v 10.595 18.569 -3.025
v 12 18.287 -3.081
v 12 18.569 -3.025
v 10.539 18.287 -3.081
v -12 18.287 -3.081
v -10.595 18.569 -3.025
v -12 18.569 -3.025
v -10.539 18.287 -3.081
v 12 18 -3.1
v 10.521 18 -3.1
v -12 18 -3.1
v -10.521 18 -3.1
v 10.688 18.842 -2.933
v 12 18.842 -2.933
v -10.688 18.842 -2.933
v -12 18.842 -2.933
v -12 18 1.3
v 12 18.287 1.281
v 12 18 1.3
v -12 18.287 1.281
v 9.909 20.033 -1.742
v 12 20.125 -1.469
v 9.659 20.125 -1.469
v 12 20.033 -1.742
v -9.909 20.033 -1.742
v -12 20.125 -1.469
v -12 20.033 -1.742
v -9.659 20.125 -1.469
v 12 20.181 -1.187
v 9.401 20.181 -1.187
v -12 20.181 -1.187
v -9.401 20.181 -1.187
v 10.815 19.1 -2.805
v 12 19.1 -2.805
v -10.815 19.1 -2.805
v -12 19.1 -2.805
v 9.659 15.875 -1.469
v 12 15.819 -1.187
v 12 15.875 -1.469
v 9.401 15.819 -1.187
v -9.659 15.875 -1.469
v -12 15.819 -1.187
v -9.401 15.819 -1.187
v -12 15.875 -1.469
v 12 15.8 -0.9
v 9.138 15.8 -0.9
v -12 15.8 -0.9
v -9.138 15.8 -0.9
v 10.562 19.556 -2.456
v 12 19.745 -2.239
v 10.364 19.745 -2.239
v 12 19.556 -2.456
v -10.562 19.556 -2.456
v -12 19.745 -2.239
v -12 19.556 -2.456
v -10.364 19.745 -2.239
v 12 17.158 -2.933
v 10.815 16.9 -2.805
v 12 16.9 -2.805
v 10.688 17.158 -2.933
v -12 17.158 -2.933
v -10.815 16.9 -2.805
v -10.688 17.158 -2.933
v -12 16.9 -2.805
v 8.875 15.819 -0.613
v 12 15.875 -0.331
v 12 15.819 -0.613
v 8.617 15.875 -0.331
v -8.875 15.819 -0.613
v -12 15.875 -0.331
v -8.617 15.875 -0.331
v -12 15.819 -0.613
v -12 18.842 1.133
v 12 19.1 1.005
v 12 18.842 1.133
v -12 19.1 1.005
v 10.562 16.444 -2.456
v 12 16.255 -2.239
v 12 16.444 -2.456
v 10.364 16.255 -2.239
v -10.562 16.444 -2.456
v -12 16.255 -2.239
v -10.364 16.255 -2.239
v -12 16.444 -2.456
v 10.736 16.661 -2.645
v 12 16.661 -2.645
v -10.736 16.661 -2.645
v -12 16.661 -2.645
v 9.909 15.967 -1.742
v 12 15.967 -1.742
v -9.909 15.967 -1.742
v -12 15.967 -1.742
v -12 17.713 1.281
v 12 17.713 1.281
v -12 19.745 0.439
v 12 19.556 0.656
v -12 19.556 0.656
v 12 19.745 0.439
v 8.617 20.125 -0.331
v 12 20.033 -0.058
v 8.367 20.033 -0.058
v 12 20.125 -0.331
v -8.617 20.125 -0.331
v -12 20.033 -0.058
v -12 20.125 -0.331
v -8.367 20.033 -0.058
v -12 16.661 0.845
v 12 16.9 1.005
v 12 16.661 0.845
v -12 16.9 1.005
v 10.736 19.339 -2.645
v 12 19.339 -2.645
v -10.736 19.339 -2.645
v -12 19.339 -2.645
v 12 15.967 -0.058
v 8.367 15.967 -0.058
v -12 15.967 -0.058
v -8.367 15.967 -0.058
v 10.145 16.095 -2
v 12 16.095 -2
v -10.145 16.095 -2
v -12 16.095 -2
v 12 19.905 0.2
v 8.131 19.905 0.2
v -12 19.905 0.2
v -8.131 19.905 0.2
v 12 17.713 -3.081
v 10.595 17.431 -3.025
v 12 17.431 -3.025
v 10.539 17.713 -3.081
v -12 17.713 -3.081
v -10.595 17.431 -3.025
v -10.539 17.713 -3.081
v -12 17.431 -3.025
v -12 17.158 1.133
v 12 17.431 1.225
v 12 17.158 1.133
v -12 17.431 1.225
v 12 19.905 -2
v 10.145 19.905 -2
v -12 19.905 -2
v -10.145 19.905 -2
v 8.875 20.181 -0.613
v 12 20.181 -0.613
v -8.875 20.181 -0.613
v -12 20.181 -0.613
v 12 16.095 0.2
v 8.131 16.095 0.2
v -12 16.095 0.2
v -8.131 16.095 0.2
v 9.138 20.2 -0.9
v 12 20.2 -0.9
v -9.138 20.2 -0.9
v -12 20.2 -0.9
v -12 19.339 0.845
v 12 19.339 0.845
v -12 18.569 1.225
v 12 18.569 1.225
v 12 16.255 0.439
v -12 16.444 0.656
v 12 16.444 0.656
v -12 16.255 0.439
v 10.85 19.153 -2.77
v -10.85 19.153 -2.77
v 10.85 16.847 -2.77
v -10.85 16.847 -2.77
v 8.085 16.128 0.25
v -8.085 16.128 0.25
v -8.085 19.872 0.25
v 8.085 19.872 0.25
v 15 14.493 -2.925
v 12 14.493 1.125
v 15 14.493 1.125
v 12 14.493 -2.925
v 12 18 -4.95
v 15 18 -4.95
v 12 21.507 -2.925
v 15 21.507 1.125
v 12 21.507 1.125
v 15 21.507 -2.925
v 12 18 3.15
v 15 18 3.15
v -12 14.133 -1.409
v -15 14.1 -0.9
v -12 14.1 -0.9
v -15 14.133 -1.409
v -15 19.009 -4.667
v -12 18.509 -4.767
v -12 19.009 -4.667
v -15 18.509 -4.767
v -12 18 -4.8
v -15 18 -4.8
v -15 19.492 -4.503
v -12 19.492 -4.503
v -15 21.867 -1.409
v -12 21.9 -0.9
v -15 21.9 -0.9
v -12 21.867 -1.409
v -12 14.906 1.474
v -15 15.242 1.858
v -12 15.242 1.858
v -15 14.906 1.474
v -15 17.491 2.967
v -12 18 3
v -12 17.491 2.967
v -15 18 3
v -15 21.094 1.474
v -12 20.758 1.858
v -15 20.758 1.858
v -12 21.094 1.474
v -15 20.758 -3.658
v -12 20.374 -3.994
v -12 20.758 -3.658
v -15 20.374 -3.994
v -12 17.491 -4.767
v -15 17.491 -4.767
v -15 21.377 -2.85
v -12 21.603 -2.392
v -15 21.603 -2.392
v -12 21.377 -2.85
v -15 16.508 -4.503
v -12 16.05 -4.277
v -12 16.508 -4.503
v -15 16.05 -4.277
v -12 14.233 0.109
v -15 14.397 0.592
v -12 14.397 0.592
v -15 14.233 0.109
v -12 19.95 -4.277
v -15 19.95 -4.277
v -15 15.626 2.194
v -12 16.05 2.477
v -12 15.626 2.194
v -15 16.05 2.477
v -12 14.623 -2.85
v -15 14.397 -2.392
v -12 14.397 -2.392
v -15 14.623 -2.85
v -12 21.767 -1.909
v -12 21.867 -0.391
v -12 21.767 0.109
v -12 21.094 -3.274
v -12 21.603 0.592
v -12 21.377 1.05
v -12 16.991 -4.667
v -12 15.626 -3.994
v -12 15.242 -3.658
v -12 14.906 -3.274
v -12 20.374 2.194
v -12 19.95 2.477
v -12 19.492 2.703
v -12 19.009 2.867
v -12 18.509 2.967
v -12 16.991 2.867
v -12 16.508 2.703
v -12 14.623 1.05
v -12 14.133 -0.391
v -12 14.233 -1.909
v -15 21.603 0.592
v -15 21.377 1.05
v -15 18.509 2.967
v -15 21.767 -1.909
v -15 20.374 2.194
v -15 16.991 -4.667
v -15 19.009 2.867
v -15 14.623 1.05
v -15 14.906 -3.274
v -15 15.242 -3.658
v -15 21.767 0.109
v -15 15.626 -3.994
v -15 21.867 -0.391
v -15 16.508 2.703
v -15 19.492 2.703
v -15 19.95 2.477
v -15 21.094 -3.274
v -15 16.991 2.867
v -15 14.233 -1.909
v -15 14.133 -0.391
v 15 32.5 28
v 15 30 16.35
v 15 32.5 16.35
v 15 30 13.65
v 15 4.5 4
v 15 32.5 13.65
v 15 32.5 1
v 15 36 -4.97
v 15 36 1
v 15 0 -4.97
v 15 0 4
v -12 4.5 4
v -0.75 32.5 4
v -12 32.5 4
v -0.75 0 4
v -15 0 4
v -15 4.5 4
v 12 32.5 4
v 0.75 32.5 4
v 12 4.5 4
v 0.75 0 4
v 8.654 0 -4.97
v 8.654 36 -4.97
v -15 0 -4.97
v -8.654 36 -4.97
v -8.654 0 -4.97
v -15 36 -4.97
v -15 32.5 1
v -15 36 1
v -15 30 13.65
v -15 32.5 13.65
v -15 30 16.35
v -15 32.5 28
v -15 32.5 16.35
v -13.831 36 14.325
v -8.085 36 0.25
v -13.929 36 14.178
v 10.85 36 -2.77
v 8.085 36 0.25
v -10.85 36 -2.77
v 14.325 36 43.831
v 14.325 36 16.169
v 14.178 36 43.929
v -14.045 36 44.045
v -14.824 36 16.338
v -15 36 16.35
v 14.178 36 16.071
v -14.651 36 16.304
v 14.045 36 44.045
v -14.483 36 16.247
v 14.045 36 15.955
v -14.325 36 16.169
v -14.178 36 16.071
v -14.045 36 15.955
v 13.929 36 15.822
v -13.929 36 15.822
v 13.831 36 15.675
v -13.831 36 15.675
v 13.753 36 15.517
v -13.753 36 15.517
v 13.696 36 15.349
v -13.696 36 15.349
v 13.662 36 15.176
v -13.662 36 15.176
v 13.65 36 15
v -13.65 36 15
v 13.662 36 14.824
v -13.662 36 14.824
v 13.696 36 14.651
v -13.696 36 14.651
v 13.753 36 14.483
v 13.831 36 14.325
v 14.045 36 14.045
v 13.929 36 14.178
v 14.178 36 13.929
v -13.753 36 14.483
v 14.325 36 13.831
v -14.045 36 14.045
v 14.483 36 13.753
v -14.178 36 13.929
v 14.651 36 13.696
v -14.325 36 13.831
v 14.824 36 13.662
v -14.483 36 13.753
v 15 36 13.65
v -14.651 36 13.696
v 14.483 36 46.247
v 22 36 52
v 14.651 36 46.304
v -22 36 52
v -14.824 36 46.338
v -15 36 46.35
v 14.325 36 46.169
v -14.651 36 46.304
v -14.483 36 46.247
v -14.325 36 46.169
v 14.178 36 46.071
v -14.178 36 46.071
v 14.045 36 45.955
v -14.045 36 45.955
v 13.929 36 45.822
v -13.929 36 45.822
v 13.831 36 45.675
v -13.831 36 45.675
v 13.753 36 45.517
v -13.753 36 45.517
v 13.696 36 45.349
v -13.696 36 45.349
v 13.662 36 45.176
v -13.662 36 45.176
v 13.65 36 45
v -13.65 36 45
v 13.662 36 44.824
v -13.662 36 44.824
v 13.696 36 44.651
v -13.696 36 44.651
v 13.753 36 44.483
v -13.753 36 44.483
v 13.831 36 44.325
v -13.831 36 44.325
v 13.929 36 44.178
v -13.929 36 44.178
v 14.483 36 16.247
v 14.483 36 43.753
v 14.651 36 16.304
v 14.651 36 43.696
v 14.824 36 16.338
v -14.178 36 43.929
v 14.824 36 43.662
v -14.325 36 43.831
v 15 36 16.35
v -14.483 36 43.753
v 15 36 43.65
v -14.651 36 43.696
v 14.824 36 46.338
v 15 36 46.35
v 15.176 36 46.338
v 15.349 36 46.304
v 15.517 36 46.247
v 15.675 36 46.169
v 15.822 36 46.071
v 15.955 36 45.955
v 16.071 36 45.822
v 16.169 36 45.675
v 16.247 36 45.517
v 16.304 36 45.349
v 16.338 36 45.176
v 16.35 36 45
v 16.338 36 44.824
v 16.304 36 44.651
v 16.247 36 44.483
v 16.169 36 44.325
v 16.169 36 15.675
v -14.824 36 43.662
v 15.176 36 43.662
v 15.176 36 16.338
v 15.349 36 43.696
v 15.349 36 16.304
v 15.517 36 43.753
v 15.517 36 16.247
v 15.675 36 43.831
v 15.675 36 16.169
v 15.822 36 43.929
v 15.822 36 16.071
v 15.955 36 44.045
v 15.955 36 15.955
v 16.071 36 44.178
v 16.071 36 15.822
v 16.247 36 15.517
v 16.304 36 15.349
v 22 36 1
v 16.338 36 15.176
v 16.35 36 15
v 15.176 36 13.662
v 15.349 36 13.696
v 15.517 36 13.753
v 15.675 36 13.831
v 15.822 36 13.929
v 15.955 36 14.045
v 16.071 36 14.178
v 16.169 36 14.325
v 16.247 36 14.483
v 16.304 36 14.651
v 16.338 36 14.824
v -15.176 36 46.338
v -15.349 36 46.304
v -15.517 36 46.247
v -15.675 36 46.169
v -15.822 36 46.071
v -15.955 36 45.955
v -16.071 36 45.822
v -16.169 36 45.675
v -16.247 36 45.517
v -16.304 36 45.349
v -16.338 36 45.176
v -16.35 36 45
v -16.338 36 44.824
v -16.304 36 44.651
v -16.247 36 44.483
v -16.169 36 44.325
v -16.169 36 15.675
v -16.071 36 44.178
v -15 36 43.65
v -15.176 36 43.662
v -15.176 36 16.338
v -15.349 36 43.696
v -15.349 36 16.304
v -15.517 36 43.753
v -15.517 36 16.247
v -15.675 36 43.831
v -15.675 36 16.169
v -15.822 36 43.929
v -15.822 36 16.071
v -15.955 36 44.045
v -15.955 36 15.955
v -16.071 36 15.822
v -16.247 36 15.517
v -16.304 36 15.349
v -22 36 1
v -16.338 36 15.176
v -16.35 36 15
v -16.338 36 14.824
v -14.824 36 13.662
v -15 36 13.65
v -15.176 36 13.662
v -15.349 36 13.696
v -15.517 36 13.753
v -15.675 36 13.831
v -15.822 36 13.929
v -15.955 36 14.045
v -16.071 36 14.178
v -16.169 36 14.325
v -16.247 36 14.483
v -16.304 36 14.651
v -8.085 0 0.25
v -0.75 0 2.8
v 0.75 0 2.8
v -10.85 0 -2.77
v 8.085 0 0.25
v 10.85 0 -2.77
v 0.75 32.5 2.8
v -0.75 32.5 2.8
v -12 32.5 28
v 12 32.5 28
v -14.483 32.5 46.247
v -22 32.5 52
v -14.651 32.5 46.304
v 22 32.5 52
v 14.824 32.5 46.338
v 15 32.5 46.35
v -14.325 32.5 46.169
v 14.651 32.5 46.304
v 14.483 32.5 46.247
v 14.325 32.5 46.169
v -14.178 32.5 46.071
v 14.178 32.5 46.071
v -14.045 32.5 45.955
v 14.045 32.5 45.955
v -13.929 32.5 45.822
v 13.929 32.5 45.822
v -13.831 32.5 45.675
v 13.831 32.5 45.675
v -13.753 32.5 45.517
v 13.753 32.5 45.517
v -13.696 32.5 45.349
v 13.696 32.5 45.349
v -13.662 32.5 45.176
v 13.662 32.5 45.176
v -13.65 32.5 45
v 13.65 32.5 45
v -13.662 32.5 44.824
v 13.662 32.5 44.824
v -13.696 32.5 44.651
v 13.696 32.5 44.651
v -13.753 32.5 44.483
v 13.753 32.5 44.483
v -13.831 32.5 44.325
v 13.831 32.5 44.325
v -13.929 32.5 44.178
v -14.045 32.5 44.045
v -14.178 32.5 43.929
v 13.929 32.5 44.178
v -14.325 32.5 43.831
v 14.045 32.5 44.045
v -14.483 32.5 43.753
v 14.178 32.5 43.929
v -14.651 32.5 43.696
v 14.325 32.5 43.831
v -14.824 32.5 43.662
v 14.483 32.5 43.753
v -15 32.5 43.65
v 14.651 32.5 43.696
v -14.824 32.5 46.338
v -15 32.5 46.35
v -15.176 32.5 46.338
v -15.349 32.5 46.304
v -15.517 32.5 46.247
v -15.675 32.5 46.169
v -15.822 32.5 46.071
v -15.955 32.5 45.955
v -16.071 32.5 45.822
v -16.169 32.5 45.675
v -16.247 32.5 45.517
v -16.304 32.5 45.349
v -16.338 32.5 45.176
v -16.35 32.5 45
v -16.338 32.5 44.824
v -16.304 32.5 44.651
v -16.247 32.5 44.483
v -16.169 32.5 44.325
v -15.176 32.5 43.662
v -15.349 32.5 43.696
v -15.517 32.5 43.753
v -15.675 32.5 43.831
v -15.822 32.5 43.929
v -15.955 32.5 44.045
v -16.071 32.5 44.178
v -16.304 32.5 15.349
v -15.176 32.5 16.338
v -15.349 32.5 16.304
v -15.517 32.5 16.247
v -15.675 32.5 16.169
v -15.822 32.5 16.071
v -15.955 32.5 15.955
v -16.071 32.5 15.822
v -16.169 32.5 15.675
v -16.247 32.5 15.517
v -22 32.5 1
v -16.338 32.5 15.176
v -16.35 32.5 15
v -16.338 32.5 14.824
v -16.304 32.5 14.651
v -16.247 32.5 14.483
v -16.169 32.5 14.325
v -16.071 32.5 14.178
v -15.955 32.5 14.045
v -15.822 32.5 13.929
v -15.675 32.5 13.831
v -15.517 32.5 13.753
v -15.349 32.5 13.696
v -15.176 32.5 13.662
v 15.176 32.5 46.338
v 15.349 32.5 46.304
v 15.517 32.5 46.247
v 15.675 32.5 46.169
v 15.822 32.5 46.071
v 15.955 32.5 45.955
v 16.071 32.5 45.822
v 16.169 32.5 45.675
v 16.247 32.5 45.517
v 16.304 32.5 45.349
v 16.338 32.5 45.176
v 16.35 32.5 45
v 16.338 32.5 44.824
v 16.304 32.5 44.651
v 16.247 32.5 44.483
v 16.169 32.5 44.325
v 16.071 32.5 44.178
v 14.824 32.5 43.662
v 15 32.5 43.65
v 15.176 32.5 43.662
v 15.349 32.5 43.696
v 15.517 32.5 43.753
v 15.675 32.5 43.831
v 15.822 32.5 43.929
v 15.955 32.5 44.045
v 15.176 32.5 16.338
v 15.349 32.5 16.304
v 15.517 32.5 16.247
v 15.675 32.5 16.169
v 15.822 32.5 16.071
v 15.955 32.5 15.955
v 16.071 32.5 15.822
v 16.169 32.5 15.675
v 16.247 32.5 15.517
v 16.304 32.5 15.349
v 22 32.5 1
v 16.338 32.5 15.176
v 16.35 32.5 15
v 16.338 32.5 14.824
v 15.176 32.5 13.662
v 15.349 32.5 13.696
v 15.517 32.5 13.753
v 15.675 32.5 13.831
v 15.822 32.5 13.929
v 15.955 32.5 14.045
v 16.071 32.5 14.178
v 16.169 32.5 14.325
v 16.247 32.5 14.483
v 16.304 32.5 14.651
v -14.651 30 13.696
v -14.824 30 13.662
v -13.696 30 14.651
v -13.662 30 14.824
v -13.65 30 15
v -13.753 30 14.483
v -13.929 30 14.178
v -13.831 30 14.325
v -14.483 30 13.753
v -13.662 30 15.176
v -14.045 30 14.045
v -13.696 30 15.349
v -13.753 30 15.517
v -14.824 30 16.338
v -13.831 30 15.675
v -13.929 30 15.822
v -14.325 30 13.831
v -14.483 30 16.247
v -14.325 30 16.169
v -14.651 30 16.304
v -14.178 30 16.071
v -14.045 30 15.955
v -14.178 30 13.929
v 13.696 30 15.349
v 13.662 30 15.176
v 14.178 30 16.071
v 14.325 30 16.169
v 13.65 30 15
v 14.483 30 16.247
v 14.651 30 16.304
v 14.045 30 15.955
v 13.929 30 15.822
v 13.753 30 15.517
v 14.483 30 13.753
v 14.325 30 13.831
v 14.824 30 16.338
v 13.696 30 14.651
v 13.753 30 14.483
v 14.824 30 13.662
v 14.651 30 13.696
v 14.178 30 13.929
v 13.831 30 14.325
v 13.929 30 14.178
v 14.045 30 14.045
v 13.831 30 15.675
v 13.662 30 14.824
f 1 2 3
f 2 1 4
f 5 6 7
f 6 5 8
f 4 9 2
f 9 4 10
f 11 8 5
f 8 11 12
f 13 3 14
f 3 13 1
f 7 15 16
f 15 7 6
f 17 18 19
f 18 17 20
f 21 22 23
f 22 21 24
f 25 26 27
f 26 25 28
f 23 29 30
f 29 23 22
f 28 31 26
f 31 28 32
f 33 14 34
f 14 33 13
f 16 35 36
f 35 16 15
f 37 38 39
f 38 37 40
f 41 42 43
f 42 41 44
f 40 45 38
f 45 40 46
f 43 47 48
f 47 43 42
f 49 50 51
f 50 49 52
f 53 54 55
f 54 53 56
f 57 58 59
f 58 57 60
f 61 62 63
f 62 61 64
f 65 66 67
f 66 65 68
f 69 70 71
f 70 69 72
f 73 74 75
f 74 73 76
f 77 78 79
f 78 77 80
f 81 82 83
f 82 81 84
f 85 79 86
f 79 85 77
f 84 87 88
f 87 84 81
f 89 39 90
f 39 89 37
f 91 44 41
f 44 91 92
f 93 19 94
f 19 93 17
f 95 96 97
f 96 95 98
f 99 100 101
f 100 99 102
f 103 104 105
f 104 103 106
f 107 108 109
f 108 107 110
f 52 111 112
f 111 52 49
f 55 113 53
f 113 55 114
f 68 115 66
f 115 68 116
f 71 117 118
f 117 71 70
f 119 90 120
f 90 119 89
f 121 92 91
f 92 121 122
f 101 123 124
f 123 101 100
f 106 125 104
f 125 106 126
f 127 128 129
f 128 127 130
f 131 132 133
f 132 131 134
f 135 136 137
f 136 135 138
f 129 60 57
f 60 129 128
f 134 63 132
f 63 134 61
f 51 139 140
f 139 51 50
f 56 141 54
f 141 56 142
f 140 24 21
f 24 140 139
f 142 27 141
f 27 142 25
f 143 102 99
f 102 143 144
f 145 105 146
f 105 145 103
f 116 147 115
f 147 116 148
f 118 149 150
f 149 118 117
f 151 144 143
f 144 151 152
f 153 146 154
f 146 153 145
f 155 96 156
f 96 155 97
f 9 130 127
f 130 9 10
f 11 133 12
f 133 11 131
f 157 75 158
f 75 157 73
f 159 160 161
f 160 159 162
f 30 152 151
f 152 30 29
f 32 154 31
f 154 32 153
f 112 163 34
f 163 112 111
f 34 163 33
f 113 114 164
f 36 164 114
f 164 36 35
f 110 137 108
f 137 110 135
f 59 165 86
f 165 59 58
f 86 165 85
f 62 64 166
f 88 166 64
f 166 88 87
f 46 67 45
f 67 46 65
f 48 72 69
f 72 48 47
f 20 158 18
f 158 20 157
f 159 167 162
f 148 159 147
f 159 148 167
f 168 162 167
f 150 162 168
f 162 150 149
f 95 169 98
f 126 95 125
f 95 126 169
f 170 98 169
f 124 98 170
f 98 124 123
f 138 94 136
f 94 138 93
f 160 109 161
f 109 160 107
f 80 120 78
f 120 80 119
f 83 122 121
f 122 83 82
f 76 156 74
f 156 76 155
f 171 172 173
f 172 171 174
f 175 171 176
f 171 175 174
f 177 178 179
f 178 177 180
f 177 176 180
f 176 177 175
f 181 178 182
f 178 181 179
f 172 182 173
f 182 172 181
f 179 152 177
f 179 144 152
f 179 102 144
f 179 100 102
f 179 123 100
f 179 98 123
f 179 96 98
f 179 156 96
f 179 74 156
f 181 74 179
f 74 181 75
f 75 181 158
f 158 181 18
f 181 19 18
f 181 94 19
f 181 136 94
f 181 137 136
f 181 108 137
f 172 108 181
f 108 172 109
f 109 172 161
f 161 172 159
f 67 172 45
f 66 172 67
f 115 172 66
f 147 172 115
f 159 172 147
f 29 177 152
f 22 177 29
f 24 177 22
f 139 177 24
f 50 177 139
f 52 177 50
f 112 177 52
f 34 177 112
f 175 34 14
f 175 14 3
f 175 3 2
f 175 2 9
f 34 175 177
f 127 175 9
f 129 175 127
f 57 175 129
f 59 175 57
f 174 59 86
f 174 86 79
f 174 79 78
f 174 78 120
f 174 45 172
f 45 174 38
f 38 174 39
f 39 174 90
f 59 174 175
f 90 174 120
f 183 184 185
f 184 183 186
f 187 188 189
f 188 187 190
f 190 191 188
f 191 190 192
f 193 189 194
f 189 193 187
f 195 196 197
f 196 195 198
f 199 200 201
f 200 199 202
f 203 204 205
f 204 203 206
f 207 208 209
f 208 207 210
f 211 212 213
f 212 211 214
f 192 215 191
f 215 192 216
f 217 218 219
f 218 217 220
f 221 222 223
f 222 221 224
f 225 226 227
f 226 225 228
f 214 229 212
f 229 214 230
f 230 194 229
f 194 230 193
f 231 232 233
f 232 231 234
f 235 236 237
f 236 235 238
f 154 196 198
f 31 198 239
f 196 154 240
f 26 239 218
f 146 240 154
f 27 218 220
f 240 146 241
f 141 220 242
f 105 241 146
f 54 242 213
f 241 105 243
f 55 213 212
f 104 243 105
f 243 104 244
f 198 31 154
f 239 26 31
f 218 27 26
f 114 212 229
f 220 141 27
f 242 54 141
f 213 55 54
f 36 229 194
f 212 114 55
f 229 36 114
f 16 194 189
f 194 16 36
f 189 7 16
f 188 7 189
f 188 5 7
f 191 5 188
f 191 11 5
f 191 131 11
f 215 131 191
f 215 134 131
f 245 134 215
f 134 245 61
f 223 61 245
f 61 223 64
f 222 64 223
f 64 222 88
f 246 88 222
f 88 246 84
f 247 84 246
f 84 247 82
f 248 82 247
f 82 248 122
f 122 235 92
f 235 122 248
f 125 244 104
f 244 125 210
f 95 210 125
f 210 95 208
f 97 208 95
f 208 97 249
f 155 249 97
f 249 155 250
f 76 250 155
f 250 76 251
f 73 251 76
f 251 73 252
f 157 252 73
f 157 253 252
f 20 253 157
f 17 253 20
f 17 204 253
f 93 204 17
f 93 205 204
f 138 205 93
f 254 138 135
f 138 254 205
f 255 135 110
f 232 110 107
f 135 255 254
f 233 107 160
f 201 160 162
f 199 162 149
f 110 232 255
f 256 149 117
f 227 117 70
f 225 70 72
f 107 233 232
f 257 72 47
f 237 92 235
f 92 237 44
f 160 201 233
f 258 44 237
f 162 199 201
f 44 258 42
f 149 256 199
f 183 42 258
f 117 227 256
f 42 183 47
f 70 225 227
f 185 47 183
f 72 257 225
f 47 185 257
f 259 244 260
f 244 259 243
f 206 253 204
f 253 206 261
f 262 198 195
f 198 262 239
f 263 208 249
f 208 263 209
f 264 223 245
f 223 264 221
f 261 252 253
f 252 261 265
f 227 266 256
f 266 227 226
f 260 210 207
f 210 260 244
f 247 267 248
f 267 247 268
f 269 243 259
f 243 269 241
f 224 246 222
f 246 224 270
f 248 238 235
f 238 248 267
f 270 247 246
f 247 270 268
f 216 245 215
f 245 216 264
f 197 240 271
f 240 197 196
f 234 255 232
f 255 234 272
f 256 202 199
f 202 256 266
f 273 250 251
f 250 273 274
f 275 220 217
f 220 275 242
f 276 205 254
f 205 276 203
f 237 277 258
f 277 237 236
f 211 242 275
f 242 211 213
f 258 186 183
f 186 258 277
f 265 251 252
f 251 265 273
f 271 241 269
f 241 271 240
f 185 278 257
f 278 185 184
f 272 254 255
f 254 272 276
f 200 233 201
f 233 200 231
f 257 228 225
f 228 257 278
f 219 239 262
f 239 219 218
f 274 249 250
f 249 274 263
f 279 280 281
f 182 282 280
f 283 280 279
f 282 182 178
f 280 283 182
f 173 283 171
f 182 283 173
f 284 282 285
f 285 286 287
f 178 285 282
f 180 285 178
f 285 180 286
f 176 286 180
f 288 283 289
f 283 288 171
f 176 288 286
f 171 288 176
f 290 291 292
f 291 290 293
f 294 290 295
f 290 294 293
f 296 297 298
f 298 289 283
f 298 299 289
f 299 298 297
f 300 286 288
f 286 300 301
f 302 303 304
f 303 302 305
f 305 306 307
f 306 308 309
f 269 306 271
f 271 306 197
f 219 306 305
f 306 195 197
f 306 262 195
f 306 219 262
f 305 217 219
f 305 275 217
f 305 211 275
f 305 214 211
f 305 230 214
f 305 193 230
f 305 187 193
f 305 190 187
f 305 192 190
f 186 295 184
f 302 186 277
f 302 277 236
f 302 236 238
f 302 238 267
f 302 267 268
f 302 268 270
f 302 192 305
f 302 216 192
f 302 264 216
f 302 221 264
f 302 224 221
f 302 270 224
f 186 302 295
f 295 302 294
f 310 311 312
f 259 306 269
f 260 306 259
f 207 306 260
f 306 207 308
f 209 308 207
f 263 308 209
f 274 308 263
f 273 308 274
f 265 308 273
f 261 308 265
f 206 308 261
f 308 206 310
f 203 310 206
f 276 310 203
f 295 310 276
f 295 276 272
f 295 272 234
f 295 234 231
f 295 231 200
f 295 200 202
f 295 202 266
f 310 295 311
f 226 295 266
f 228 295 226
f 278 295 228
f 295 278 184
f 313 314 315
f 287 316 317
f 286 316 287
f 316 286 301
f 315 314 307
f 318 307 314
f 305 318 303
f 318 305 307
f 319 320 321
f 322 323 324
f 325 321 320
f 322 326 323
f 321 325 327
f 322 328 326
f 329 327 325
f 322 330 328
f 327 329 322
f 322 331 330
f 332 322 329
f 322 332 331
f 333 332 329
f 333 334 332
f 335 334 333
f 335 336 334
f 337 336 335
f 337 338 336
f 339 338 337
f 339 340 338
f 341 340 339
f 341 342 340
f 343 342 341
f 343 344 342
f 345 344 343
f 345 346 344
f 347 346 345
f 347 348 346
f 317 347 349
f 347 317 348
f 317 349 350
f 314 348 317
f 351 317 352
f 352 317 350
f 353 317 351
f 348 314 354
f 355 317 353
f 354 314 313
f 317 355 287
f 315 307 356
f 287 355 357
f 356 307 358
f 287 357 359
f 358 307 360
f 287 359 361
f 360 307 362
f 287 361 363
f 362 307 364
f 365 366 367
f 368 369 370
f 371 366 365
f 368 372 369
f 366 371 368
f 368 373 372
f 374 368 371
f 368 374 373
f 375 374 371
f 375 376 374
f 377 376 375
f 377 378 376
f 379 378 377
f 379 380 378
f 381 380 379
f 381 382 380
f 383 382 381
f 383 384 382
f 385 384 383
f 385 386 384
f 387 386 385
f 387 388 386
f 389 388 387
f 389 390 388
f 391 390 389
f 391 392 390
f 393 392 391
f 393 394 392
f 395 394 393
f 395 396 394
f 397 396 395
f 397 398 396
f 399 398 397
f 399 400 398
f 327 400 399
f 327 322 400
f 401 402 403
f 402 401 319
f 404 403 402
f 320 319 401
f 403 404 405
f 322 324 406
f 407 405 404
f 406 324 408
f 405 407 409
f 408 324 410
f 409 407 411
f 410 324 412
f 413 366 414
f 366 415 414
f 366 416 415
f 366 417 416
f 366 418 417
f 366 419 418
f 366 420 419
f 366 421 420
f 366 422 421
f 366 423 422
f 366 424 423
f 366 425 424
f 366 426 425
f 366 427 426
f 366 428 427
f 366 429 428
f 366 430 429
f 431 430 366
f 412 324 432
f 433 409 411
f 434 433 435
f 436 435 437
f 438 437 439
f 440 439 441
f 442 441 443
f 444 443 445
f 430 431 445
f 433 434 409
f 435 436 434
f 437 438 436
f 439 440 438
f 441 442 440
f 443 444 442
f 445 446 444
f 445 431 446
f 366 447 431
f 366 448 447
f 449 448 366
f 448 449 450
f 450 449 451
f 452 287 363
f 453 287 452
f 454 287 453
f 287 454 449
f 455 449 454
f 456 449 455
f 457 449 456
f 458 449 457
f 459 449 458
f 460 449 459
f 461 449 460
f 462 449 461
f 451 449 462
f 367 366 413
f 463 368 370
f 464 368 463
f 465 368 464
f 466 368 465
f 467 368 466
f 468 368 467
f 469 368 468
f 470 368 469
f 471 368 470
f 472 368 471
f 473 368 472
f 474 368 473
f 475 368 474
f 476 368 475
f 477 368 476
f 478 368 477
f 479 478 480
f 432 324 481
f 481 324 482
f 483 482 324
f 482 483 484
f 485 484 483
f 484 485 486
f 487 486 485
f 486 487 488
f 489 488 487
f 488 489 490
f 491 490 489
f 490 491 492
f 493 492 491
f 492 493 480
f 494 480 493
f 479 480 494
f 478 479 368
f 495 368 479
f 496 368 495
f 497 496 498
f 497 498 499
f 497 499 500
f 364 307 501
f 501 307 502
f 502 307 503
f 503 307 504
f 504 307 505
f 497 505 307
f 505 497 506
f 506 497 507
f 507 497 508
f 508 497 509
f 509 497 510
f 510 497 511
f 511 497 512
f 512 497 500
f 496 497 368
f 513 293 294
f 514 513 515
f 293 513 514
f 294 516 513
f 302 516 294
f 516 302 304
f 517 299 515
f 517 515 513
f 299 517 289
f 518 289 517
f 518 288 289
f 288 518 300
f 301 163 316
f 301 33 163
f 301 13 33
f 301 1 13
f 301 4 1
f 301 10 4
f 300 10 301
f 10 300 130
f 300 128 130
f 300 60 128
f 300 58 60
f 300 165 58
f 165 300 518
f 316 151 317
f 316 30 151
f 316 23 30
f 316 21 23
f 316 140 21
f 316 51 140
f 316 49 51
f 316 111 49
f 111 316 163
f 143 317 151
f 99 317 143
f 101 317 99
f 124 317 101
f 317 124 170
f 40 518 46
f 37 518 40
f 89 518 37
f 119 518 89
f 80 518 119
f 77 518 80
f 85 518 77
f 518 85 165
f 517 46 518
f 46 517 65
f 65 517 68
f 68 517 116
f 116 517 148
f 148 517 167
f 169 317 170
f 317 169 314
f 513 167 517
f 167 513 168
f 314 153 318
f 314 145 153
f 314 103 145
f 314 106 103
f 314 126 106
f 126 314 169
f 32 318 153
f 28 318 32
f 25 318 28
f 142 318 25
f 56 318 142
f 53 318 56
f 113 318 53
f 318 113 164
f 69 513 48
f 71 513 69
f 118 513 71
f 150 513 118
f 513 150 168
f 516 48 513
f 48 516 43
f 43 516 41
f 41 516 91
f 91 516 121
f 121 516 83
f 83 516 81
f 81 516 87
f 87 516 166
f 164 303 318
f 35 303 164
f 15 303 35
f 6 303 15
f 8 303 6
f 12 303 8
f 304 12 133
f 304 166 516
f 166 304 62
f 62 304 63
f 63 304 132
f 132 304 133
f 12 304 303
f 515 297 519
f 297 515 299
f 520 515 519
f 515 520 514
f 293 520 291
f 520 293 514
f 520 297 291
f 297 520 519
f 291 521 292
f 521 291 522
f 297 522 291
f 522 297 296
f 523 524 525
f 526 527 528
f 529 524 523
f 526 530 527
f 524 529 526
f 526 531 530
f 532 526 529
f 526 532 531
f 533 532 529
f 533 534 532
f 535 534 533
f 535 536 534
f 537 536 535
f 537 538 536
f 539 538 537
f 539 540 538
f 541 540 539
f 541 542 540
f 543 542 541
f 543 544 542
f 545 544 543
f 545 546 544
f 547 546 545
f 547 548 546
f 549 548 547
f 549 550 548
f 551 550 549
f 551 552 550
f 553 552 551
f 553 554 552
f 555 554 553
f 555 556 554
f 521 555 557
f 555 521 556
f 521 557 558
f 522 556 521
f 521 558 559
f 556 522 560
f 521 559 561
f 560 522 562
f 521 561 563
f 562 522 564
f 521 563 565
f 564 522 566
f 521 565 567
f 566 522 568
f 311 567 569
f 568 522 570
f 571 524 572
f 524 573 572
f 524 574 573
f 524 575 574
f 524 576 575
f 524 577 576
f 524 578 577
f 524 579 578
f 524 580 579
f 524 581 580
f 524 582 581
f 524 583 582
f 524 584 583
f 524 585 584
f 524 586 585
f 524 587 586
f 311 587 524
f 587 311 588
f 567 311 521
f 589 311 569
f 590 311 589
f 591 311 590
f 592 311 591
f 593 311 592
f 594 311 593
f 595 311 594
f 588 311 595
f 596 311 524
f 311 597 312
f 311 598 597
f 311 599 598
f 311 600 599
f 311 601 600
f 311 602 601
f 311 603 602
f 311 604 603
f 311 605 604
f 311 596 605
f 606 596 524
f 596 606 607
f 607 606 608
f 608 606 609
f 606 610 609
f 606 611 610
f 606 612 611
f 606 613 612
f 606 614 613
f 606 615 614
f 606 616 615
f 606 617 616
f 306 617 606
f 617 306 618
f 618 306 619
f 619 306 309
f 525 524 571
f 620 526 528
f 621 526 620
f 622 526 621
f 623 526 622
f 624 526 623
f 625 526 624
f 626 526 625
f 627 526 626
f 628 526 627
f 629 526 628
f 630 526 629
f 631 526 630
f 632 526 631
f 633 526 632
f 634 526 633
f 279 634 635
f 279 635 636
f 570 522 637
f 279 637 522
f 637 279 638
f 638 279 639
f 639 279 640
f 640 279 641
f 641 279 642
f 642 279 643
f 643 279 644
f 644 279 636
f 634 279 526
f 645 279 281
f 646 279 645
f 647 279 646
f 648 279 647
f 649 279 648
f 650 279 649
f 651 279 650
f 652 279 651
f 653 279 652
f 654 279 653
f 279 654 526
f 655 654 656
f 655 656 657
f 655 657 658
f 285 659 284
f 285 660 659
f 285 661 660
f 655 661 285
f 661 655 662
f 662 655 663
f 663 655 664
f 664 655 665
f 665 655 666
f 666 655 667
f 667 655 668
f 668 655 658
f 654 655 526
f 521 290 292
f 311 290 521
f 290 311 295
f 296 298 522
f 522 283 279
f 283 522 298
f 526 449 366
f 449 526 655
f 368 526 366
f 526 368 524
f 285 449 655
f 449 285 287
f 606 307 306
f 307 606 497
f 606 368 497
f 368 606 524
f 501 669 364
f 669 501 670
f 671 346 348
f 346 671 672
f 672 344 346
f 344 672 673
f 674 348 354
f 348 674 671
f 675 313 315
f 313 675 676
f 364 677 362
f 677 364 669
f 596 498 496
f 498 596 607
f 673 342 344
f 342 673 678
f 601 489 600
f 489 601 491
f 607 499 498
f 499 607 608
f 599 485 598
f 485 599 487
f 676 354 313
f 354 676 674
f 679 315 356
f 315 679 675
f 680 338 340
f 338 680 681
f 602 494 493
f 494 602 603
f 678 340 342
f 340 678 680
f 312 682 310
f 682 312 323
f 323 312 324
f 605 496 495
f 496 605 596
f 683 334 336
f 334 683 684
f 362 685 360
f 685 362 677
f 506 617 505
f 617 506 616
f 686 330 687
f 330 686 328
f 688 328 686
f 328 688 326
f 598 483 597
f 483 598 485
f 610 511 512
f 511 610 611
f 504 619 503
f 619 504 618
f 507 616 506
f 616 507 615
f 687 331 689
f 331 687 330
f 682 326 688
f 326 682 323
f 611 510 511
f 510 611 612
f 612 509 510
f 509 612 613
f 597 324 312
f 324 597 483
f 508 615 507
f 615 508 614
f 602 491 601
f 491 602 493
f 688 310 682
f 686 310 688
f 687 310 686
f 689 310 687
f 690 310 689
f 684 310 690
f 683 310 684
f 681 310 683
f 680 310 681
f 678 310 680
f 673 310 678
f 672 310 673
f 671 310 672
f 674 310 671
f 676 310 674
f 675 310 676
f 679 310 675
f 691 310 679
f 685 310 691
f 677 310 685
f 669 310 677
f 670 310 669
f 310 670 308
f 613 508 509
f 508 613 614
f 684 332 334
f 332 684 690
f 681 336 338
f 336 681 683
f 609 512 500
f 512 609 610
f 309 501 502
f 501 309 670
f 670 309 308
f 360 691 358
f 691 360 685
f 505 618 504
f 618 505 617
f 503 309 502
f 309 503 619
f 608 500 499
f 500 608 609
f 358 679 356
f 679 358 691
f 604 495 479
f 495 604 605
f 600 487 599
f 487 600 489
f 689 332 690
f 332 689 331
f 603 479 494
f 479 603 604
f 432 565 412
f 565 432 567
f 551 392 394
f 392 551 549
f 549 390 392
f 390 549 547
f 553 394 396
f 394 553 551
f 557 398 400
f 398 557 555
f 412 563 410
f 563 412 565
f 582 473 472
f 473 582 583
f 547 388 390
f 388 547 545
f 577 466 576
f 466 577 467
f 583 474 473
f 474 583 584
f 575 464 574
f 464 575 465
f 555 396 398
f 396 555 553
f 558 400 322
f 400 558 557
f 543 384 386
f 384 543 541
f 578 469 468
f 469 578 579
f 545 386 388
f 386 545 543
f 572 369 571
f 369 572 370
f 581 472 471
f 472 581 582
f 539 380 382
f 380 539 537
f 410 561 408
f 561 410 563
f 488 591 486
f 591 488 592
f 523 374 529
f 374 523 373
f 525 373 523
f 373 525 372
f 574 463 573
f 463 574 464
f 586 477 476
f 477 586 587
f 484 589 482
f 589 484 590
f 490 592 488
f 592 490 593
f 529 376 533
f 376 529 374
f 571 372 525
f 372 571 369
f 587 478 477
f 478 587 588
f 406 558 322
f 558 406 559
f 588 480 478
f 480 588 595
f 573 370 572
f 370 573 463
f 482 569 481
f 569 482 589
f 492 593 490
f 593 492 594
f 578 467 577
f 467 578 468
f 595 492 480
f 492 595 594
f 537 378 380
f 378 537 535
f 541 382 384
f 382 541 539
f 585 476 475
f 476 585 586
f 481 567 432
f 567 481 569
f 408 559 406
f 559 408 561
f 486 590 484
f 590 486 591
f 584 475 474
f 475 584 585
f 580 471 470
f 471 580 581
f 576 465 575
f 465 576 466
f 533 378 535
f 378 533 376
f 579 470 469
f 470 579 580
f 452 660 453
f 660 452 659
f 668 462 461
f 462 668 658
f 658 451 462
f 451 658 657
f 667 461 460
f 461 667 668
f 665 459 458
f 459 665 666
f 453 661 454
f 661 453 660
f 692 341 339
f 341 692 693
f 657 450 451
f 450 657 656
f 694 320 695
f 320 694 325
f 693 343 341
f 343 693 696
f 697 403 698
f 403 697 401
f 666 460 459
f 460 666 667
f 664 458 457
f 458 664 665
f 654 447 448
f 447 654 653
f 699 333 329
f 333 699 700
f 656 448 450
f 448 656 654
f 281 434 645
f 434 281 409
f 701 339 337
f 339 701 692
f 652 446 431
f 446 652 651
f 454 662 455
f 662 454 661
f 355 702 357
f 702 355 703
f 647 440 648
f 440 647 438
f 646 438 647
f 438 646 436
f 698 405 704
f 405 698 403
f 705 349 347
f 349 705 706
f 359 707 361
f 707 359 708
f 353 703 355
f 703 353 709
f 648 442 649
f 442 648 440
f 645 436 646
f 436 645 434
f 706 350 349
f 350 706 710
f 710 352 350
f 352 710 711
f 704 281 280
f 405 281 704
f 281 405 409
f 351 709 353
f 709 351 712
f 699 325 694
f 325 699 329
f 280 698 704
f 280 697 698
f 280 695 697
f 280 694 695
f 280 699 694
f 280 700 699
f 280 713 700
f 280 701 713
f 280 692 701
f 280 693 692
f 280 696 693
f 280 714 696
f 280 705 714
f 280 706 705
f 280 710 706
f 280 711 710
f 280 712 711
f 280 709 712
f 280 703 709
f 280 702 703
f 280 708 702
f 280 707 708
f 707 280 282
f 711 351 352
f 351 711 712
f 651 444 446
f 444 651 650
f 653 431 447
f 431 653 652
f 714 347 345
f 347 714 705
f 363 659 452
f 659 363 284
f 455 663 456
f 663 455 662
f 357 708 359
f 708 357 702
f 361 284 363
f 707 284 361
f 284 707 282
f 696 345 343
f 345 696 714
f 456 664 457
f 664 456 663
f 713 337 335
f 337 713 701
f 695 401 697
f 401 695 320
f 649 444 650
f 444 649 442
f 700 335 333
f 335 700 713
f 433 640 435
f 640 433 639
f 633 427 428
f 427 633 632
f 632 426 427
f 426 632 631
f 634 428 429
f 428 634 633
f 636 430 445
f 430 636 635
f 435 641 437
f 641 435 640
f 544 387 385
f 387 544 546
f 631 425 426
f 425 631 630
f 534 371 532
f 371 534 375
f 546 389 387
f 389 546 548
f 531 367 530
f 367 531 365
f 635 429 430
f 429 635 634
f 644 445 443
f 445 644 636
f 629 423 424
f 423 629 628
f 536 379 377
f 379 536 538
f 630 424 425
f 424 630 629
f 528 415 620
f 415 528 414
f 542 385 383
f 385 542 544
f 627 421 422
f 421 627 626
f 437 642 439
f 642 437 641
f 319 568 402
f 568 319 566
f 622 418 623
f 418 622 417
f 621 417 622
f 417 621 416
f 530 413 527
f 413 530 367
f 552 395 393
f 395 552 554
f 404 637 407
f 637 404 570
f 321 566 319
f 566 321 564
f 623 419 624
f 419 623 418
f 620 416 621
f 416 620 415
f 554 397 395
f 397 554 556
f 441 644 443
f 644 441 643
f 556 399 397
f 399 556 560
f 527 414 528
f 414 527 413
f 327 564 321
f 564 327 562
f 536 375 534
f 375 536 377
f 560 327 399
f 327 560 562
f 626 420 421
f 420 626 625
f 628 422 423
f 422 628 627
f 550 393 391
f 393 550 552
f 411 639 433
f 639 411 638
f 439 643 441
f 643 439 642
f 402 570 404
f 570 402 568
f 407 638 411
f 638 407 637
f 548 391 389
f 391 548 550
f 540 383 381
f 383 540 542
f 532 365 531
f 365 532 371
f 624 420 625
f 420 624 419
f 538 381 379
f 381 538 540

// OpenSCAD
// file: lib.scad
// Shared pieces for the AudioTarget enclosures. Units: mm.
// Print in PETG or ASA (PLA softens in a hot car), 0.2 mm layers, 4 walls.

$fn = 48;
clear = 0.25;   // fit clearance; raise to 0.3-0.4 if parts are too tight

// ---------------------------------------------------------------- Picatinny
// MIL-STD-1913 cross-section: 15.67 mm flat top, 45 degree flanks out to
// 21.2 mm at 2.77 mm down, then back in at 45 degrees.
rail_top_w   = 15.67;
rail_crest_w = 21.2;
rail_crest_d = 2.77;
rail_slot_w  = 5.23;   // cross slots, 10.01 mm pitch
rail_slot_p  = 10.01;

// Rail profile (with clearance) as seen from the muzzle; z=0 is the top of the rail.
module rail_profile(c = clear) {
    t = rail_top_w / 2 + c;
    k = rail_crest_w / 2 + c;
    polygon([[-t, 0 + c], [t, 0 + c], [k, -rail_crest_d], [t, -2 * rail_crest_d],
             [t, -20], [-t, -20], [-t, -2 * rail_crest_d], [-k, -rail_crest_d]]);
}

// Slide-on clamp. Its top face is at z = roof (sits roof mm above the rail).
// A cross bolt (M4) runs through a rail slot to lock it and squeeze the jaws.
module rail_clamp(len = 30, width = 30, roof = 4, bolt_at = 15) {
    jaw_depth = rail_crest_d + 2.2;     // jaws hook under the crest
    difference() {
        translate([-width / 2, 0, -jaw_depth]) cube([width, len, jaw_depth + roof]);
        // the rail
        rotate([90, 0, 0]) translate([0, 0, -len - 1])
            linear_extrude(len + 2) rail_profile();
        // cross bolt, nut trap one side, head counterbore the other
        translate([0, bolt_at, -0.9]) rotate([0, 90, 0]) {
            cylinder(d = 4.4, h = width + 2, center = true);
            translate([0, 0, width / 2 - 3]) cylinder(d = 8.1, h = 4, $fn = 6);
            translate([0, 0, -width / 2 - 1]) cylinder(d = 7.8, h = 4);
        }
        // relief cut so the jaws can flex onto the rail
        translate([-0.75, -1, roof - 1.2]) cube([1.5, len + 2, 2]);
    }
}

// ---------------------------------------------------------------- boxes
module rounded_box(size, r = 3) {
    hull() for (x = [r, size.x - r], y = [r, size.y - r])
        translate([x, y, 0]) cylinder(r = r, h = size.z);
}

// Open-top box with inner size `inner`, wall `w`, floor `f`.
module tray(inner, w = 2, f = 2, r = 3) {
    difference() {
        rounded_box([inner.x + 2 * w, inner.y + 2 * w, inner.z + f], r);
        translate([w, w, f]) rounded_box([inner.x, inner.y, inner.z + 1], max(r - w, 0.5));
    }
}

// Lid with a lip that drops inside the tray.
module lid(inner, w = 2, t = 2, lip = 2.5, r = 3) {
    rounded_box([inner.x + 2 * w, inner.y + 2 * w, t], r);
    translate([w + clear, w + clear, -lip])
        difference() {
            rounded_box([inner.x - 2 * clear, inner.y - 2 * clear, lip], max(r - w, 0.5));
            translate([1.2, 1.2, -1]) rounded_box([inner.x - 2 * clear - 2.4, inner.y - 2 * clear - 2.4, lip + 2], 0.5);
        }
}

// Screw post for an M2.5 (or M2) self-tapping screw.
module post(h, d = 5.5, hole = 2.2) {
    difference() { cylinder(d = d, h = h); translate([0, 0, 1]) cylinder(d = hole, h = h); }
}

// Tactile dimples, for subtracting from a top surface at z=0 (lids print
// top-face-down, so raised marks would sit on the print bed).
module dimples(n, pitch = 3.5, d = 2.2, depth = 0.9) {
    for (i = [0 : n - 1]) translate([i * pitch - (n - 1) * pitch / 2, 0, -depth])
        cylinder(d = d, h = depth + 1, $fn = 20);
}
// main file
// Camera on a Picatinny rail, lens forward along the barrel.
// The camera board bolts to the FRONT face of the plate on 6 mm spacers
// (M2.5 x 12 screws from behind), leaving room for the ribbon or USB cable.
// Default: Raspberry Pi HQ camera (38 mm board, M2.5 holes on a 30 mm square).
// For a USB camera module, change board/holes to suit.
include <lib.scad>

board   = 38;     // board width/height
holes   = 30;     // mounting-hole square
hole_d  = 2.7;    // M2.5 clearance
axis_h  = 30;     // lens centre height above the rail top
plate_t = 3.5;

difference() {
    union() {
        rail_clamp(len = 36, width = 30, roof = 4, bolt_at = 18);
        // upright plate at the front of the clamp
        translate([-(board + 6) / 2, 36 - plate_t, 1])
            cube([board + 6, plate_t, axis_h + board / 2 + 2]);
        // gussets
        for (x = [-15, 12])   // on the clamp's top, at its edges
            translate([x, 36 - plate_t, 4]) rotate([90, 0, 90])
                linear_extrude(3) polygon([[0, 0], [-28, 0], [0, axis_h - 6]]);
    }
    // board holes
    for (x = [-holes / 2, holes / 2], z = [axis_h - holes / 2, axis_h + holes / 2])
        translate([x, 30, z]) rotate([-90, 0, 0]) cylinder(d = hole_d, h = 20);
}
